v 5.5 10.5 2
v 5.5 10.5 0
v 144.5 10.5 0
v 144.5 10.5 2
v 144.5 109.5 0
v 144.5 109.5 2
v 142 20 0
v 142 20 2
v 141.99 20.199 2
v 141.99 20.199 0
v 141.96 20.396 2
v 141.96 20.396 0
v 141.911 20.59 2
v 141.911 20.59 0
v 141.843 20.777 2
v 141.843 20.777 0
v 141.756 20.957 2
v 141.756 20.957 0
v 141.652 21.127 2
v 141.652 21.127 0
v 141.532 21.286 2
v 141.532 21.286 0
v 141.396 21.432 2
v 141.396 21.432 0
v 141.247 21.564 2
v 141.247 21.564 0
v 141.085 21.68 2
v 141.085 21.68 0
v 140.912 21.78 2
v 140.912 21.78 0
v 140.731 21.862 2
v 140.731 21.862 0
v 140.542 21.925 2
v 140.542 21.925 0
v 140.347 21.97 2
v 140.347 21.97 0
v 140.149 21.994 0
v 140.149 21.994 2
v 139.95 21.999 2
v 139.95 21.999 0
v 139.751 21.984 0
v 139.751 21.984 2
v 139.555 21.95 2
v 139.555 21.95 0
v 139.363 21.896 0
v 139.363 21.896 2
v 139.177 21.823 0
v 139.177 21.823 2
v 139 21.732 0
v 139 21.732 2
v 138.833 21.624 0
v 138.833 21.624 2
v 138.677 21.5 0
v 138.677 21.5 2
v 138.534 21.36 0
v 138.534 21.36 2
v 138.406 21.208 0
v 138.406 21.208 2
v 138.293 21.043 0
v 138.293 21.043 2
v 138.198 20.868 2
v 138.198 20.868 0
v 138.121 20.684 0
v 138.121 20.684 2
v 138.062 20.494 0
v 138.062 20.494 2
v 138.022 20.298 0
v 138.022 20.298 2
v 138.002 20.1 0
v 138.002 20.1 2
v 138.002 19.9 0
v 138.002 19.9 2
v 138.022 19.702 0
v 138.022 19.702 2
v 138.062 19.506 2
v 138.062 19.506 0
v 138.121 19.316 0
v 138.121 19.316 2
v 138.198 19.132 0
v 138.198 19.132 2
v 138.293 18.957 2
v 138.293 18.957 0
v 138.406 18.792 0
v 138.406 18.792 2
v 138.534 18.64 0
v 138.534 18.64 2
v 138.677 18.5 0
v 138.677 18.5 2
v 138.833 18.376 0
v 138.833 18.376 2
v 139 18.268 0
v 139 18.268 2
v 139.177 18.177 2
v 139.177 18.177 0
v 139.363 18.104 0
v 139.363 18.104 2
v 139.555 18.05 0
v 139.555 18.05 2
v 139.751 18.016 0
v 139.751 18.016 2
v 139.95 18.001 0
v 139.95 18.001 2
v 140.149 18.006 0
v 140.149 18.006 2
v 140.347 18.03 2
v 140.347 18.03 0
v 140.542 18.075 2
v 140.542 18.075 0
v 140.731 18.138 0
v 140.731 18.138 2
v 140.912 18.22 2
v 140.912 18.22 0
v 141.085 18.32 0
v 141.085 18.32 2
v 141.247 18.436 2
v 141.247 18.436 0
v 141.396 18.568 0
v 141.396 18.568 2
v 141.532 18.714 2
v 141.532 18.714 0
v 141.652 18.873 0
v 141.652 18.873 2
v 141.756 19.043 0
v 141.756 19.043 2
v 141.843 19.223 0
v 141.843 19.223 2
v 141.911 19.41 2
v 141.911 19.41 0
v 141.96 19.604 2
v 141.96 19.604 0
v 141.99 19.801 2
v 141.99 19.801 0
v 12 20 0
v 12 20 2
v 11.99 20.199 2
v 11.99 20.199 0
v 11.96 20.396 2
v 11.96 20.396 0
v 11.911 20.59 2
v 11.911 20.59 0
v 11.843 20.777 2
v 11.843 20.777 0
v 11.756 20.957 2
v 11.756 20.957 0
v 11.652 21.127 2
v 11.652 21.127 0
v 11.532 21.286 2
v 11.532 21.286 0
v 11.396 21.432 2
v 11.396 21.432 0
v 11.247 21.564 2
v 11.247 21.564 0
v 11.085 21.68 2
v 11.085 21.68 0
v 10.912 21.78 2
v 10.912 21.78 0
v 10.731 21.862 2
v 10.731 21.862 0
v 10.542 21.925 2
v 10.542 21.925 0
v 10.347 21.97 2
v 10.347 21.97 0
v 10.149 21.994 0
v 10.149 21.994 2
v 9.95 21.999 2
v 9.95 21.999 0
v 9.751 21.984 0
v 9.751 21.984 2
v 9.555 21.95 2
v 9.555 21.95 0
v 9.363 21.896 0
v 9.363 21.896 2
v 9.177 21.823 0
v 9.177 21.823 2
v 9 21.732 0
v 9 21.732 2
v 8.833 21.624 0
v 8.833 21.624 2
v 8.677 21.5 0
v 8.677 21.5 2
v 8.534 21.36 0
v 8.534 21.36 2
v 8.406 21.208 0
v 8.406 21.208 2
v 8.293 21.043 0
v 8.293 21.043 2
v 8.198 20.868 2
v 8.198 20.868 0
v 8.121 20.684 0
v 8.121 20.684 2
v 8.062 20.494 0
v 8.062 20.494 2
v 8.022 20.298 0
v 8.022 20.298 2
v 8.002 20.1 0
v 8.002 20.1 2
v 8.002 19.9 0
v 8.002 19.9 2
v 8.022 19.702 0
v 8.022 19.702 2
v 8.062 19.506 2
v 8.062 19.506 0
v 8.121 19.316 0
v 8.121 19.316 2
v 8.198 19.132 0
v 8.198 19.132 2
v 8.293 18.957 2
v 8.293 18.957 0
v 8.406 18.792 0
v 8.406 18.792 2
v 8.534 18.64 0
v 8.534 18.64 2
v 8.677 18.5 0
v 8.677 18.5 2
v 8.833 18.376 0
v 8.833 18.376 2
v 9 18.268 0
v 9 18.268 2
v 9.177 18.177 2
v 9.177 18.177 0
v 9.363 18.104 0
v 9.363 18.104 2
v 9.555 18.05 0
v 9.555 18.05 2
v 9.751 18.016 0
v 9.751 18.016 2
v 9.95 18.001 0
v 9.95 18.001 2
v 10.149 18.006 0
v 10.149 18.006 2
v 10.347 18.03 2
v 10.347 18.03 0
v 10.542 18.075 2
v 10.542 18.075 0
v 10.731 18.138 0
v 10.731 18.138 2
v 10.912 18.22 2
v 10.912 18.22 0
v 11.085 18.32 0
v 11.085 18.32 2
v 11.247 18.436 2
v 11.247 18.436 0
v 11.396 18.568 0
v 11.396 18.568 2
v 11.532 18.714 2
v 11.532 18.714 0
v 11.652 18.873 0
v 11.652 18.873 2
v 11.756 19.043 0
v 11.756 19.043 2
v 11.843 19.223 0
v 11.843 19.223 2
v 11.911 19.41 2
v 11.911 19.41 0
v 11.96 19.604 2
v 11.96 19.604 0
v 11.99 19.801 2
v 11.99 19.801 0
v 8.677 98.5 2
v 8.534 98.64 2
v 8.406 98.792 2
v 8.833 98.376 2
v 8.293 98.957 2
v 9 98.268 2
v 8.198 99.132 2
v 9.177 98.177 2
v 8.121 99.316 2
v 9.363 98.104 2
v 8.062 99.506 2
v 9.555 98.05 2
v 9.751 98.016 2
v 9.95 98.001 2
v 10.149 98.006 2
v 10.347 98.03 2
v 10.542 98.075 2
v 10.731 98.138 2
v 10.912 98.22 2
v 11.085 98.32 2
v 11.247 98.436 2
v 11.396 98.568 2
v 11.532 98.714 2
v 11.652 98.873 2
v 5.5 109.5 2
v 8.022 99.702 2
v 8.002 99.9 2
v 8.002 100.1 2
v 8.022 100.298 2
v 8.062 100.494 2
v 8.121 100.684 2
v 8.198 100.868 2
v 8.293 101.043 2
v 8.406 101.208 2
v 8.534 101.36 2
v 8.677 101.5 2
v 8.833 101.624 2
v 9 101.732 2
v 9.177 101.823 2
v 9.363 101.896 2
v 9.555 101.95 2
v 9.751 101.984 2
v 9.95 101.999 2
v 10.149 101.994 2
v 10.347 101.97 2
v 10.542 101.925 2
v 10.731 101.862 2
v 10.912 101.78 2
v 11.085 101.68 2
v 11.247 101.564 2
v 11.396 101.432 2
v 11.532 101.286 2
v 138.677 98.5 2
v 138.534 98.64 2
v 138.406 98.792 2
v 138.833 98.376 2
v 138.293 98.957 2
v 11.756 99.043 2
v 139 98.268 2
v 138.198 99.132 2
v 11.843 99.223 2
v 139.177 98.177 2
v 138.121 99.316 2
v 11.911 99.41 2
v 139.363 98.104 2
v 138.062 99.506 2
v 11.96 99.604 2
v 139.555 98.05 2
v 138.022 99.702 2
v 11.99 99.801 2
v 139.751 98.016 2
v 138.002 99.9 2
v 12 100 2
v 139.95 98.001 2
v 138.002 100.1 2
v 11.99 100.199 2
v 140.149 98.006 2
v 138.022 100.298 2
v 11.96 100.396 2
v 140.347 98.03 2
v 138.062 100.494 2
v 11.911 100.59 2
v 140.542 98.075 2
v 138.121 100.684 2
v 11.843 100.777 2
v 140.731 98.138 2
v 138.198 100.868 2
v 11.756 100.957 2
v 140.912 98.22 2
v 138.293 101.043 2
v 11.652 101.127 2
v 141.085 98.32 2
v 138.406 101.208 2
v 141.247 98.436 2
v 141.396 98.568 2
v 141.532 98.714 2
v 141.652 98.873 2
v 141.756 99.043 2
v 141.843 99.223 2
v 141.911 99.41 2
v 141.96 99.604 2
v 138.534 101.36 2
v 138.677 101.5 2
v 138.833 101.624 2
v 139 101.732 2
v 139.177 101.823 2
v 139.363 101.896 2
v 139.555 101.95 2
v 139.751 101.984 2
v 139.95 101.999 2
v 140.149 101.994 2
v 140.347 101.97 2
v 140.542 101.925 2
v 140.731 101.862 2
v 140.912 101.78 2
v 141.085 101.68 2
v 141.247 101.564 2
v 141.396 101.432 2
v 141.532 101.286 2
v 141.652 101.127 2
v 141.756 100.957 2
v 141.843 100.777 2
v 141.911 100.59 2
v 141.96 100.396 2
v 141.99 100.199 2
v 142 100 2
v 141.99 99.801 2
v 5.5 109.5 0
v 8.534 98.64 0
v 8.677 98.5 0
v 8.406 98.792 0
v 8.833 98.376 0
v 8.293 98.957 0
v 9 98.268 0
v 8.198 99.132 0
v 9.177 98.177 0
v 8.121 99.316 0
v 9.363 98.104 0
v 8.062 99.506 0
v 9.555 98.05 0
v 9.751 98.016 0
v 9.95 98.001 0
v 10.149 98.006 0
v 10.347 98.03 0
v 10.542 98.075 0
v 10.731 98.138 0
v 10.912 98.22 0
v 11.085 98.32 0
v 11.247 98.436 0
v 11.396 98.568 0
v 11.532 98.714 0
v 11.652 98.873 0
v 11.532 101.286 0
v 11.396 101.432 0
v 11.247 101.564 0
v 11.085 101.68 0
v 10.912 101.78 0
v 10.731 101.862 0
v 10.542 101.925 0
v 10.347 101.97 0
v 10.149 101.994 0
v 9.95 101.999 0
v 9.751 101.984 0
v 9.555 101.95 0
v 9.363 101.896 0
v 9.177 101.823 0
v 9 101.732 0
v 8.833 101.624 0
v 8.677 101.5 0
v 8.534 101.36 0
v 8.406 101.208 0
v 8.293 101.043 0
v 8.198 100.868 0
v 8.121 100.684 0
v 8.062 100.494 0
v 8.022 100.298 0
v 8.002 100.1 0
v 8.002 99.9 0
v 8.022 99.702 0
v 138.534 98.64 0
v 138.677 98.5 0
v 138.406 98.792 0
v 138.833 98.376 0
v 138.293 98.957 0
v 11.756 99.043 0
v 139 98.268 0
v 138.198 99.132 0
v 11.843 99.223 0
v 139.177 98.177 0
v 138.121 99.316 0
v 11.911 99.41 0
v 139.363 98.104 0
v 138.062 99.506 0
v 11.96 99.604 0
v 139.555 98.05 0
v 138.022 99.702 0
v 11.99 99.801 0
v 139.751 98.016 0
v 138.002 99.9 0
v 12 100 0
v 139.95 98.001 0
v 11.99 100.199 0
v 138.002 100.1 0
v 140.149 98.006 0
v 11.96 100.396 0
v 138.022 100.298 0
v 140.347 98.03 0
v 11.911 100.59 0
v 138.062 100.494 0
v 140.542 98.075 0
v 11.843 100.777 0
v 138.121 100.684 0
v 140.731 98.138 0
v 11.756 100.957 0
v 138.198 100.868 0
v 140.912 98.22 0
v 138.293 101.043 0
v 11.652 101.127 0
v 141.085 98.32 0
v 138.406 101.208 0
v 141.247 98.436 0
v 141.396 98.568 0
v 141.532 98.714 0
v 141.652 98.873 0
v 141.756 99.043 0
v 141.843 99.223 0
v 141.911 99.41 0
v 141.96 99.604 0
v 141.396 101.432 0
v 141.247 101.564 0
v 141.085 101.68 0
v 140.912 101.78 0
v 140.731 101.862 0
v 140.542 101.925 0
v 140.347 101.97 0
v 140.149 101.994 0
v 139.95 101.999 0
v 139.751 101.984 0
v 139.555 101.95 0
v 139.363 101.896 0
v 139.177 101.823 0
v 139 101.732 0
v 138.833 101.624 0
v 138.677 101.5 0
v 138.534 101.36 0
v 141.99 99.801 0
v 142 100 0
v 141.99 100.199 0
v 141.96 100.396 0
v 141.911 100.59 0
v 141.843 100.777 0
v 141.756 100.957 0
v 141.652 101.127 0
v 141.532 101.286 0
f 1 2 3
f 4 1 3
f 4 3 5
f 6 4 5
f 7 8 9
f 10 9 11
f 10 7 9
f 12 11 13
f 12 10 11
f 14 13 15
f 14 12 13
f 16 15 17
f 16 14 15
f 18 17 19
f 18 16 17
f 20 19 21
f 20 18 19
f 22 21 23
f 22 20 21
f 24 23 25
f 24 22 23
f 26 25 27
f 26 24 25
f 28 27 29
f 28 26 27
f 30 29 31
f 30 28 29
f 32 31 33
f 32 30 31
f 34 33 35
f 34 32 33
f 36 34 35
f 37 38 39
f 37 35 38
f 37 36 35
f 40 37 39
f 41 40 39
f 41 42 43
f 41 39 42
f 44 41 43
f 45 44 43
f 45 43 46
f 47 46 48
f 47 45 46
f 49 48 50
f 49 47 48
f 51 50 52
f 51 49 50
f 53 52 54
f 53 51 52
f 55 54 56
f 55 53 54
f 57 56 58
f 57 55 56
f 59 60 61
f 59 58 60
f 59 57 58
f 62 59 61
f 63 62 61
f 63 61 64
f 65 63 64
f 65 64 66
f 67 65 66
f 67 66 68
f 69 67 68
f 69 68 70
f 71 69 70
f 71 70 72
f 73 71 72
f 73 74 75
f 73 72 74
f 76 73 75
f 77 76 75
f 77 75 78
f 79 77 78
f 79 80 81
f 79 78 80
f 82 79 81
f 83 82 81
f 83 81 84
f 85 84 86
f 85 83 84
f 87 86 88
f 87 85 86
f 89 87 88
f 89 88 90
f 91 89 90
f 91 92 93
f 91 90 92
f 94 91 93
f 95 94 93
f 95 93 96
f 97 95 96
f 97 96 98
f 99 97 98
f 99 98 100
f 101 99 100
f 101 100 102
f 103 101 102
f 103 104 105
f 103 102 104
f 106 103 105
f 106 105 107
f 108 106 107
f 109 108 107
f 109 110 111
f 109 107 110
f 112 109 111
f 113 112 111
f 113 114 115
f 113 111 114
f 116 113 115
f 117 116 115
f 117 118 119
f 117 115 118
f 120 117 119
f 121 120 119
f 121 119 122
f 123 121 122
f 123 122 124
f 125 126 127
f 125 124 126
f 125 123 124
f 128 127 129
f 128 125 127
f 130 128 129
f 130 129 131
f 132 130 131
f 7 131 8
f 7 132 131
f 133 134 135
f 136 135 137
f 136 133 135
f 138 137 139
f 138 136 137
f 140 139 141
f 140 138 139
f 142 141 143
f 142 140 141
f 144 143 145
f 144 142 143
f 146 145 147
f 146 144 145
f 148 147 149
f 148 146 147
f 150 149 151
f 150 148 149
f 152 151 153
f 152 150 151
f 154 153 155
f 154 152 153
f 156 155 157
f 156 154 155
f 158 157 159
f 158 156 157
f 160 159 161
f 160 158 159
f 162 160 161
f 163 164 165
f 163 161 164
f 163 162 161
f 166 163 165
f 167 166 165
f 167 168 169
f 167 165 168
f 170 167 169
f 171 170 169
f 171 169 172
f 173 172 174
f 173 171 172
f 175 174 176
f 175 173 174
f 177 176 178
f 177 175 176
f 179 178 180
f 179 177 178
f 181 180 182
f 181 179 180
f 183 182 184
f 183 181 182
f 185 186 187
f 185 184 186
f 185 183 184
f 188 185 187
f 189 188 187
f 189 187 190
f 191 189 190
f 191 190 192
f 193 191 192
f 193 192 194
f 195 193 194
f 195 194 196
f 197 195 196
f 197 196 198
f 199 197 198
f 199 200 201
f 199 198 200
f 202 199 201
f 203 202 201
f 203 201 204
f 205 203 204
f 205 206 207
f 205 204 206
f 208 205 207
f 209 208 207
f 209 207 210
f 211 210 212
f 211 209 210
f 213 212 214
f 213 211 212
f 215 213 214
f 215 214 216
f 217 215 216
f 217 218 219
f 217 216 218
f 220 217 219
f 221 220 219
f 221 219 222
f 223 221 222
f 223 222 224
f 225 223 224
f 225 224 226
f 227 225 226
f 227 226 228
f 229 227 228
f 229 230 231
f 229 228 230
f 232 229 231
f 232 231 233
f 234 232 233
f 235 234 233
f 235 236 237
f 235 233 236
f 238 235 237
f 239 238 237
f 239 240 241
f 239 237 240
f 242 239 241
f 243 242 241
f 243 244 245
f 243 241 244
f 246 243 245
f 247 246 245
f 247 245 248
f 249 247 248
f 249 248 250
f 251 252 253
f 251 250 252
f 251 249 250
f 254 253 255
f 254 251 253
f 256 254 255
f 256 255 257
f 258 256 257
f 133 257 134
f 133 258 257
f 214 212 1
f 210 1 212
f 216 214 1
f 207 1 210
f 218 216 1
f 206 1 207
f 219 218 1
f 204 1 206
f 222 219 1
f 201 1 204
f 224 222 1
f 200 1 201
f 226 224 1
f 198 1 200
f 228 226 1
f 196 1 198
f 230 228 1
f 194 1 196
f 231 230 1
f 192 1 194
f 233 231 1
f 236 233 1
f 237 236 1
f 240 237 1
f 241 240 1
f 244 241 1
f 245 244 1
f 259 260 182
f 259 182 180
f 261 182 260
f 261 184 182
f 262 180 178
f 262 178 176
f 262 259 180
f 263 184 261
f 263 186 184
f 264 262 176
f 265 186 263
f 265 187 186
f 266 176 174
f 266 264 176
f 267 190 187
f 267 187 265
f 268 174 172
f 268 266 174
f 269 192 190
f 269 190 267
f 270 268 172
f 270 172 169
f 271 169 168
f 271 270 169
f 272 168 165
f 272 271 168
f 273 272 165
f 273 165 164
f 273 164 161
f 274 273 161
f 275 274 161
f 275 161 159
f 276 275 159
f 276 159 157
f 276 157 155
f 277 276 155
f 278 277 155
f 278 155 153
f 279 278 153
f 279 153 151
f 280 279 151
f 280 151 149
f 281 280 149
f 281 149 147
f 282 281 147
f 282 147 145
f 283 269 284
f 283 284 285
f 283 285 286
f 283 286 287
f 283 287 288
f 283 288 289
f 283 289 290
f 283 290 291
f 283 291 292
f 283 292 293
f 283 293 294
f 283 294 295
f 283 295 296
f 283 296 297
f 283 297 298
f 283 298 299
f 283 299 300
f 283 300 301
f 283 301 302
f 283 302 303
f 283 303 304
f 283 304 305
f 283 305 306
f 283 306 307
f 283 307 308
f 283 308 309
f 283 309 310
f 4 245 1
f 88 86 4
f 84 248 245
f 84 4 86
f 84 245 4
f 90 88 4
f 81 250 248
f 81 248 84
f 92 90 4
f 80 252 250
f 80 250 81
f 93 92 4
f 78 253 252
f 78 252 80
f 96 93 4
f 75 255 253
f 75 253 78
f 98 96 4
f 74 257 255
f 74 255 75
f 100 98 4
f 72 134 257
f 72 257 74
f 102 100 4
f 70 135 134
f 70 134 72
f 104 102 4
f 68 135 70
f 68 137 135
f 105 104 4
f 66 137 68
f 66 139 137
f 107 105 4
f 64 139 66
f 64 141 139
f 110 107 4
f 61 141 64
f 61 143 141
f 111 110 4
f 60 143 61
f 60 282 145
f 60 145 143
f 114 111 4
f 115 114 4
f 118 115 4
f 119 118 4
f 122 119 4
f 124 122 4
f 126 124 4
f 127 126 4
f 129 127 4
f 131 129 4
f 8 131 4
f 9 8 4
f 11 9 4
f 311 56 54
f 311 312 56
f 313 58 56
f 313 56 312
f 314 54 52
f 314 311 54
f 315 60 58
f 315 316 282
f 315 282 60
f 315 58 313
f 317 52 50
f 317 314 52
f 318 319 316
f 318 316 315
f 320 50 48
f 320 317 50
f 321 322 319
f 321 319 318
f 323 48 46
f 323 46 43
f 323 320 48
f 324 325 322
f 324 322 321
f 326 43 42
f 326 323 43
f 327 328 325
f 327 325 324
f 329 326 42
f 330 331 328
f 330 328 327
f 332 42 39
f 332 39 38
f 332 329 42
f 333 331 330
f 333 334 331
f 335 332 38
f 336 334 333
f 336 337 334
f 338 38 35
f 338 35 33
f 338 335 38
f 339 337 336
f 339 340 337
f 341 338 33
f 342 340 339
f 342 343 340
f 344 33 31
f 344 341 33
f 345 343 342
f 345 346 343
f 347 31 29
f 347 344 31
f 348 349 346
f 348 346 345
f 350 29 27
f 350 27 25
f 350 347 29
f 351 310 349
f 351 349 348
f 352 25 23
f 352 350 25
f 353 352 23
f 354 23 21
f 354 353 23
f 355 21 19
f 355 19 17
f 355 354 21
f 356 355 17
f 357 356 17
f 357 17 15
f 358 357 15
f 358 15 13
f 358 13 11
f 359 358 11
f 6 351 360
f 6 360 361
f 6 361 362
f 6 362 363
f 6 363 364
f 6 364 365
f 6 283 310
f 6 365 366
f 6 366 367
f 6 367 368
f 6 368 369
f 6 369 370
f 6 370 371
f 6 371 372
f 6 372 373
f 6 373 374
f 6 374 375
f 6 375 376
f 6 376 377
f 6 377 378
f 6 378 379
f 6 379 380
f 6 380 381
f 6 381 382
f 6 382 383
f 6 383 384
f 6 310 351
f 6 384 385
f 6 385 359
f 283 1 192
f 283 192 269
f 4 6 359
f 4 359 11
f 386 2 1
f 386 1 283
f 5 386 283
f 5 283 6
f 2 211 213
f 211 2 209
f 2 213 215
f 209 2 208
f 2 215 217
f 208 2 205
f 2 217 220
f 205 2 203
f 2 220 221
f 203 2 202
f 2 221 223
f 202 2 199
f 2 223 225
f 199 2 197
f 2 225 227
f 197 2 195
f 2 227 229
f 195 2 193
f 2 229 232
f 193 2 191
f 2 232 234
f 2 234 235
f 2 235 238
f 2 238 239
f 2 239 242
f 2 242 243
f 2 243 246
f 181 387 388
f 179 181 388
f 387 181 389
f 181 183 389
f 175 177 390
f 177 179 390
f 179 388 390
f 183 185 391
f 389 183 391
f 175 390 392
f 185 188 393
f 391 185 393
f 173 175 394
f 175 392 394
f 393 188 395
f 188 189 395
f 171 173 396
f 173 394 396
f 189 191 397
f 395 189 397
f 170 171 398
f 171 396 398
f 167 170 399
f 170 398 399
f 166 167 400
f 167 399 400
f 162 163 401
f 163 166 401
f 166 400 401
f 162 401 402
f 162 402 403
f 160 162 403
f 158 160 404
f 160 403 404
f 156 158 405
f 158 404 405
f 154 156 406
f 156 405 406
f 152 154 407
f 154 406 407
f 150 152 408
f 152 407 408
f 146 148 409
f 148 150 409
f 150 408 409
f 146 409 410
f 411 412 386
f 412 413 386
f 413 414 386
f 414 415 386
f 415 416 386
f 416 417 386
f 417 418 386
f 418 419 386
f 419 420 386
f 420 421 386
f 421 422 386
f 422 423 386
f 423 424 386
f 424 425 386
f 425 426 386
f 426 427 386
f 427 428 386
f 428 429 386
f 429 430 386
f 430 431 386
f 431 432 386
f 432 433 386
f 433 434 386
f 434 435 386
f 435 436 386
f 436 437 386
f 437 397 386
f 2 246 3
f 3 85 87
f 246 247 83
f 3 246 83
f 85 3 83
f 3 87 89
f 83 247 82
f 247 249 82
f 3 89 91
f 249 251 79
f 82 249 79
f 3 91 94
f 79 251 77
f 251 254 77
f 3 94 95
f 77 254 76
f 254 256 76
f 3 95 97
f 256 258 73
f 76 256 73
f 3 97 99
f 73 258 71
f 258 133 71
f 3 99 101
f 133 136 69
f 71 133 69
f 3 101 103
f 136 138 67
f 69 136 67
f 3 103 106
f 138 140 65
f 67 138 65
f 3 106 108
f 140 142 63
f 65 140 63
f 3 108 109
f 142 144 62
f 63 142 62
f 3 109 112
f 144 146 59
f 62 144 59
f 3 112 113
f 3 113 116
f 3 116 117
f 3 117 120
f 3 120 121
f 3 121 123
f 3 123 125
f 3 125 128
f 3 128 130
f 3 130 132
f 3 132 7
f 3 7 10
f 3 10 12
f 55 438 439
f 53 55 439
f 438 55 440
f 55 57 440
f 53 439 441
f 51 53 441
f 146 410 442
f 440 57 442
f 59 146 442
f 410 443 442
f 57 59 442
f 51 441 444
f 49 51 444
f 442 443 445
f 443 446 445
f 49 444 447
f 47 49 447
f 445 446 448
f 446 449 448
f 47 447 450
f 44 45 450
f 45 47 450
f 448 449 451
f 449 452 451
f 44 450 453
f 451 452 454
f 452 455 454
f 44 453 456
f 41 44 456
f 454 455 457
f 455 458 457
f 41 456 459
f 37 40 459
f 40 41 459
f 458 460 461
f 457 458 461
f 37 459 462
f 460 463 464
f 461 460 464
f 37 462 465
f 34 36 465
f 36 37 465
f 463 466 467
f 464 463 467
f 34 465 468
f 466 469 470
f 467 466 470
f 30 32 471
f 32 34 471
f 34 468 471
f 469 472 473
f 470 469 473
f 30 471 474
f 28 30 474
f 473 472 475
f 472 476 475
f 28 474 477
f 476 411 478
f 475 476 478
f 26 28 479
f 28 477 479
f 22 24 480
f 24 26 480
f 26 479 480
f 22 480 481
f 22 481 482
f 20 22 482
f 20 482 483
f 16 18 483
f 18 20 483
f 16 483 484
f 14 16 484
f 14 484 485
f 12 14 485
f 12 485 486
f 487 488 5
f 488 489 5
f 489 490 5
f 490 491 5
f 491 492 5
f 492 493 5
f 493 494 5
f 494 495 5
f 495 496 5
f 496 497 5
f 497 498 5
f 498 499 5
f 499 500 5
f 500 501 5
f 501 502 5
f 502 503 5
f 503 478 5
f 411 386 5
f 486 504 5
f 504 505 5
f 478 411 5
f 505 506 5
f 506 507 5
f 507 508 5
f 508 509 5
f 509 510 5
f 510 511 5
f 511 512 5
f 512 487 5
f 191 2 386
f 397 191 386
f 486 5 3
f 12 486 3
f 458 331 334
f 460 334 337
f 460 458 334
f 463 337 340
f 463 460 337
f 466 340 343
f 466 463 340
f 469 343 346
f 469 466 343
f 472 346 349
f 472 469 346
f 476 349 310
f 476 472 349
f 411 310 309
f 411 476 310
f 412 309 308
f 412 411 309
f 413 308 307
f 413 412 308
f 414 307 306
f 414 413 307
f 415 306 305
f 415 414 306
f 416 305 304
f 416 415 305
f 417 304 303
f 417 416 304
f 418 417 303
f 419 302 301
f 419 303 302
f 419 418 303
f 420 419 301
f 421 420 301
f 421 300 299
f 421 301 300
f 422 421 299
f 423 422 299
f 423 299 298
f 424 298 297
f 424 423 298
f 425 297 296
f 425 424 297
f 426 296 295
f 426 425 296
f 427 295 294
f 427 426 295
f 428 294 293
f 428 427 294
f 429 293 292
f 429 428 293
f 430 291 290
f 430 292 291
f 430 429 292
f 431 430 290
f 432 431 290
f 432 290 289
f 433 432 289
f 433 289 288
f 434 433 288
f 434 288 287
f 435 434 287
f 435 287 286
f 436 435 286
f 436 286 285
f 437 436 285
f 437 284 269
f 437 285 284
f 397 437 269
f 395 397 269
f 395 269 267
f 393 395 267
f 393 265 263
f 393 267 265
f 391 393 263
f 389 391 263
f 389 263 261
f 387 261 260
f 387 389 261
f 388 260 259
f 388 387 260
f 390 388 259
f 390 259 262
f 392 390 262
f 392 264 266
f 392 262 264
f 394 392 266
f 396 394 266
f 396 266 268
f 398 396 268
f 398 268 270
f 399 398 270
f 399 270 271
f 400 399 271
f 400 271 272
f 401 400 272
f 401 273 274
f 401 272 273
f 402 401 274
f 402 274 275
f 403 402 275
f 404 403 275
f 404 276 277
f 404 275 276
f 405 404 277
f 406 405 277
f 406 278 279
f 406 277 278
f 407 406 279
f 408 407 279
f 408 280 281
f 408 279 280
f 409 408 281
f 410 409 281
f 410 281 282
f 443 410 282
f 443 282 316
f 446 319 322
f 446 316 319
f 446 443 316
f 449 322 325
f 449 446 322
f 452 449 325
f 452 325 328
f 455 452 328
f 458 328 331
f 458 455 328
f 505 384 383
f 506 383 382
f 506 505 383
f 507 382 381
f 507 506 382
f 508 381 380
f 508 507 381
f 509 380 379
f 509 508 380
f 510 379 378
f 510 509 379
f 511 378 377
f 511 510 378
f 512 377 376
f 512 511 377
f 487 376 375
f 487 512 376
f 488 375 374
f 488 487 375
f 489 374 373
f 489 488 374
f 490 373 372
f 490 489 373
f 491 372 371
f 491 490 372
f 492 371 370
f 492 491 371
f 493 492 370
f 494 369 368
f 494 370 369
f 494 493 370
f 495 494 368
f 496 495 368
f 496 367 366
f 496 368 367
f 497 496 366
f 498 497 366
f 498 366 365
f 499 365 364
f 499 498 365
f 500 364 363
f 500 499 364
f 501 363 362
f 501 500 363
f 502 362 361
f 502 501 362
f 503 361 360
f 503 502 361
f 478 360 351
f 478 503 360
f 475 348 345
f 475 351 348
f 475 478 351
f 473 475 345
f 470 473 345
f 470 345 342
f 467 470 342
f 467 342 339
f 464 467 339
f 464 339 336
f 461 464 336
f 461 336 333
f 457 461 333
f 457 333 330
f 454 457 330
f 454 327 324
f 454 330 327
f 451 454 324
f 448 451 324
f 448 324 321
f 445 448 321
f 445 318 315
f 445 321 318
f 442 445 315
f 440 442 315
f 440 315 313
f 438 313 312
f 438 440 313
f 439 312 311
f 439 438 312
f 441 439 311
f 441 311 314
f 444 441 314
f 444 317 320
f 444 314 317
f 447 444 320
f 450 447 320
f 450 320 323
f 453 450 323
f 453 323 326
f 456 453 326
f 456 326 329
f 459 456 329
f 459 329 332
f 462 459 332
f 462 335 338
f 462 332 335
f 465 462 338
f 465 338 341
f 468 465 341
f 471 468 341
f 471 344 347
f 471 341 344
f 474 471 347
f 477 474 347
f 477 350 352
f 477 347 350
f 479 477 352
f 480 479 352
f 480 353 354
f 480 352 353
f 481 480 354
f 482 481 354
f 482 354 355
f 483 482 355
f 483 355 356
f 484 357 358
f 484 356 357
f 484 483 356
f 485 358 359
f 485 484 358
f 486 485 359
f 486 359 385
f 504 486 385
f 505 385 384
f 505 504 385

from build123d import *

# Parameters (mm, degrees)
SKETCH001_W     = 139
SKETCH001_H     = 99
PAD_DEPTH       = 2
SKETCH003_R     = 2
POCKET_DEPTH    = 5
SKETCH004_R     = 2
POCKET001_DEPTH = 5
SKETCH005_R     = 2
POCKET002_DEPTH = 5
SKETCH006_R     = 2
POCKET003_DEPTH = 5


with BuildPart() as part:
    # Sketch001 → Pad (new body)
    with BuildSketch(Plane.XY):
        with Locations((75, 60)):
            Rectangle(SKETCH001_W, SKETCH001_H)
    extrude(amount=PAD_DEPTH)

    # Sketch003 → Pocket (cut)
    with BuildSketch(Plane.XY):
        with Locations((10, 20)):
            Circle(SKETCH003_R)
    extrude(amount=POCKET_DEPTH, mode=Mode.SUBTRACT)

    # Sketch004 → Pocket001 (cut)
    with BuildSketch(Plane.XY):
        with Locations((10, 100)):
            Circle(SKETCH004_R)
    extrude(amount=POCKET001_DEPTH, mode=Mode.SUBTRACT)

    # Sketch005 → Pocket002 (cut)
    with BuildSketch(Plane.XY):
        with Locations((140, 20)):
            Circle(SKETCH005_R)
    extrude(amount=POCKET002_DEPTH, mode=Mode.SUBTRACT)

    # Sketch006 → Pocket003 (cut)
    with BuildSketch(Plane.XY):
        with Locations((140, 100)):
            Circle(SKETCH006_R)
    extrude(amount=POCKET003_DEPTH, mode=Mode.SUBTRACT)


solid = part.part
